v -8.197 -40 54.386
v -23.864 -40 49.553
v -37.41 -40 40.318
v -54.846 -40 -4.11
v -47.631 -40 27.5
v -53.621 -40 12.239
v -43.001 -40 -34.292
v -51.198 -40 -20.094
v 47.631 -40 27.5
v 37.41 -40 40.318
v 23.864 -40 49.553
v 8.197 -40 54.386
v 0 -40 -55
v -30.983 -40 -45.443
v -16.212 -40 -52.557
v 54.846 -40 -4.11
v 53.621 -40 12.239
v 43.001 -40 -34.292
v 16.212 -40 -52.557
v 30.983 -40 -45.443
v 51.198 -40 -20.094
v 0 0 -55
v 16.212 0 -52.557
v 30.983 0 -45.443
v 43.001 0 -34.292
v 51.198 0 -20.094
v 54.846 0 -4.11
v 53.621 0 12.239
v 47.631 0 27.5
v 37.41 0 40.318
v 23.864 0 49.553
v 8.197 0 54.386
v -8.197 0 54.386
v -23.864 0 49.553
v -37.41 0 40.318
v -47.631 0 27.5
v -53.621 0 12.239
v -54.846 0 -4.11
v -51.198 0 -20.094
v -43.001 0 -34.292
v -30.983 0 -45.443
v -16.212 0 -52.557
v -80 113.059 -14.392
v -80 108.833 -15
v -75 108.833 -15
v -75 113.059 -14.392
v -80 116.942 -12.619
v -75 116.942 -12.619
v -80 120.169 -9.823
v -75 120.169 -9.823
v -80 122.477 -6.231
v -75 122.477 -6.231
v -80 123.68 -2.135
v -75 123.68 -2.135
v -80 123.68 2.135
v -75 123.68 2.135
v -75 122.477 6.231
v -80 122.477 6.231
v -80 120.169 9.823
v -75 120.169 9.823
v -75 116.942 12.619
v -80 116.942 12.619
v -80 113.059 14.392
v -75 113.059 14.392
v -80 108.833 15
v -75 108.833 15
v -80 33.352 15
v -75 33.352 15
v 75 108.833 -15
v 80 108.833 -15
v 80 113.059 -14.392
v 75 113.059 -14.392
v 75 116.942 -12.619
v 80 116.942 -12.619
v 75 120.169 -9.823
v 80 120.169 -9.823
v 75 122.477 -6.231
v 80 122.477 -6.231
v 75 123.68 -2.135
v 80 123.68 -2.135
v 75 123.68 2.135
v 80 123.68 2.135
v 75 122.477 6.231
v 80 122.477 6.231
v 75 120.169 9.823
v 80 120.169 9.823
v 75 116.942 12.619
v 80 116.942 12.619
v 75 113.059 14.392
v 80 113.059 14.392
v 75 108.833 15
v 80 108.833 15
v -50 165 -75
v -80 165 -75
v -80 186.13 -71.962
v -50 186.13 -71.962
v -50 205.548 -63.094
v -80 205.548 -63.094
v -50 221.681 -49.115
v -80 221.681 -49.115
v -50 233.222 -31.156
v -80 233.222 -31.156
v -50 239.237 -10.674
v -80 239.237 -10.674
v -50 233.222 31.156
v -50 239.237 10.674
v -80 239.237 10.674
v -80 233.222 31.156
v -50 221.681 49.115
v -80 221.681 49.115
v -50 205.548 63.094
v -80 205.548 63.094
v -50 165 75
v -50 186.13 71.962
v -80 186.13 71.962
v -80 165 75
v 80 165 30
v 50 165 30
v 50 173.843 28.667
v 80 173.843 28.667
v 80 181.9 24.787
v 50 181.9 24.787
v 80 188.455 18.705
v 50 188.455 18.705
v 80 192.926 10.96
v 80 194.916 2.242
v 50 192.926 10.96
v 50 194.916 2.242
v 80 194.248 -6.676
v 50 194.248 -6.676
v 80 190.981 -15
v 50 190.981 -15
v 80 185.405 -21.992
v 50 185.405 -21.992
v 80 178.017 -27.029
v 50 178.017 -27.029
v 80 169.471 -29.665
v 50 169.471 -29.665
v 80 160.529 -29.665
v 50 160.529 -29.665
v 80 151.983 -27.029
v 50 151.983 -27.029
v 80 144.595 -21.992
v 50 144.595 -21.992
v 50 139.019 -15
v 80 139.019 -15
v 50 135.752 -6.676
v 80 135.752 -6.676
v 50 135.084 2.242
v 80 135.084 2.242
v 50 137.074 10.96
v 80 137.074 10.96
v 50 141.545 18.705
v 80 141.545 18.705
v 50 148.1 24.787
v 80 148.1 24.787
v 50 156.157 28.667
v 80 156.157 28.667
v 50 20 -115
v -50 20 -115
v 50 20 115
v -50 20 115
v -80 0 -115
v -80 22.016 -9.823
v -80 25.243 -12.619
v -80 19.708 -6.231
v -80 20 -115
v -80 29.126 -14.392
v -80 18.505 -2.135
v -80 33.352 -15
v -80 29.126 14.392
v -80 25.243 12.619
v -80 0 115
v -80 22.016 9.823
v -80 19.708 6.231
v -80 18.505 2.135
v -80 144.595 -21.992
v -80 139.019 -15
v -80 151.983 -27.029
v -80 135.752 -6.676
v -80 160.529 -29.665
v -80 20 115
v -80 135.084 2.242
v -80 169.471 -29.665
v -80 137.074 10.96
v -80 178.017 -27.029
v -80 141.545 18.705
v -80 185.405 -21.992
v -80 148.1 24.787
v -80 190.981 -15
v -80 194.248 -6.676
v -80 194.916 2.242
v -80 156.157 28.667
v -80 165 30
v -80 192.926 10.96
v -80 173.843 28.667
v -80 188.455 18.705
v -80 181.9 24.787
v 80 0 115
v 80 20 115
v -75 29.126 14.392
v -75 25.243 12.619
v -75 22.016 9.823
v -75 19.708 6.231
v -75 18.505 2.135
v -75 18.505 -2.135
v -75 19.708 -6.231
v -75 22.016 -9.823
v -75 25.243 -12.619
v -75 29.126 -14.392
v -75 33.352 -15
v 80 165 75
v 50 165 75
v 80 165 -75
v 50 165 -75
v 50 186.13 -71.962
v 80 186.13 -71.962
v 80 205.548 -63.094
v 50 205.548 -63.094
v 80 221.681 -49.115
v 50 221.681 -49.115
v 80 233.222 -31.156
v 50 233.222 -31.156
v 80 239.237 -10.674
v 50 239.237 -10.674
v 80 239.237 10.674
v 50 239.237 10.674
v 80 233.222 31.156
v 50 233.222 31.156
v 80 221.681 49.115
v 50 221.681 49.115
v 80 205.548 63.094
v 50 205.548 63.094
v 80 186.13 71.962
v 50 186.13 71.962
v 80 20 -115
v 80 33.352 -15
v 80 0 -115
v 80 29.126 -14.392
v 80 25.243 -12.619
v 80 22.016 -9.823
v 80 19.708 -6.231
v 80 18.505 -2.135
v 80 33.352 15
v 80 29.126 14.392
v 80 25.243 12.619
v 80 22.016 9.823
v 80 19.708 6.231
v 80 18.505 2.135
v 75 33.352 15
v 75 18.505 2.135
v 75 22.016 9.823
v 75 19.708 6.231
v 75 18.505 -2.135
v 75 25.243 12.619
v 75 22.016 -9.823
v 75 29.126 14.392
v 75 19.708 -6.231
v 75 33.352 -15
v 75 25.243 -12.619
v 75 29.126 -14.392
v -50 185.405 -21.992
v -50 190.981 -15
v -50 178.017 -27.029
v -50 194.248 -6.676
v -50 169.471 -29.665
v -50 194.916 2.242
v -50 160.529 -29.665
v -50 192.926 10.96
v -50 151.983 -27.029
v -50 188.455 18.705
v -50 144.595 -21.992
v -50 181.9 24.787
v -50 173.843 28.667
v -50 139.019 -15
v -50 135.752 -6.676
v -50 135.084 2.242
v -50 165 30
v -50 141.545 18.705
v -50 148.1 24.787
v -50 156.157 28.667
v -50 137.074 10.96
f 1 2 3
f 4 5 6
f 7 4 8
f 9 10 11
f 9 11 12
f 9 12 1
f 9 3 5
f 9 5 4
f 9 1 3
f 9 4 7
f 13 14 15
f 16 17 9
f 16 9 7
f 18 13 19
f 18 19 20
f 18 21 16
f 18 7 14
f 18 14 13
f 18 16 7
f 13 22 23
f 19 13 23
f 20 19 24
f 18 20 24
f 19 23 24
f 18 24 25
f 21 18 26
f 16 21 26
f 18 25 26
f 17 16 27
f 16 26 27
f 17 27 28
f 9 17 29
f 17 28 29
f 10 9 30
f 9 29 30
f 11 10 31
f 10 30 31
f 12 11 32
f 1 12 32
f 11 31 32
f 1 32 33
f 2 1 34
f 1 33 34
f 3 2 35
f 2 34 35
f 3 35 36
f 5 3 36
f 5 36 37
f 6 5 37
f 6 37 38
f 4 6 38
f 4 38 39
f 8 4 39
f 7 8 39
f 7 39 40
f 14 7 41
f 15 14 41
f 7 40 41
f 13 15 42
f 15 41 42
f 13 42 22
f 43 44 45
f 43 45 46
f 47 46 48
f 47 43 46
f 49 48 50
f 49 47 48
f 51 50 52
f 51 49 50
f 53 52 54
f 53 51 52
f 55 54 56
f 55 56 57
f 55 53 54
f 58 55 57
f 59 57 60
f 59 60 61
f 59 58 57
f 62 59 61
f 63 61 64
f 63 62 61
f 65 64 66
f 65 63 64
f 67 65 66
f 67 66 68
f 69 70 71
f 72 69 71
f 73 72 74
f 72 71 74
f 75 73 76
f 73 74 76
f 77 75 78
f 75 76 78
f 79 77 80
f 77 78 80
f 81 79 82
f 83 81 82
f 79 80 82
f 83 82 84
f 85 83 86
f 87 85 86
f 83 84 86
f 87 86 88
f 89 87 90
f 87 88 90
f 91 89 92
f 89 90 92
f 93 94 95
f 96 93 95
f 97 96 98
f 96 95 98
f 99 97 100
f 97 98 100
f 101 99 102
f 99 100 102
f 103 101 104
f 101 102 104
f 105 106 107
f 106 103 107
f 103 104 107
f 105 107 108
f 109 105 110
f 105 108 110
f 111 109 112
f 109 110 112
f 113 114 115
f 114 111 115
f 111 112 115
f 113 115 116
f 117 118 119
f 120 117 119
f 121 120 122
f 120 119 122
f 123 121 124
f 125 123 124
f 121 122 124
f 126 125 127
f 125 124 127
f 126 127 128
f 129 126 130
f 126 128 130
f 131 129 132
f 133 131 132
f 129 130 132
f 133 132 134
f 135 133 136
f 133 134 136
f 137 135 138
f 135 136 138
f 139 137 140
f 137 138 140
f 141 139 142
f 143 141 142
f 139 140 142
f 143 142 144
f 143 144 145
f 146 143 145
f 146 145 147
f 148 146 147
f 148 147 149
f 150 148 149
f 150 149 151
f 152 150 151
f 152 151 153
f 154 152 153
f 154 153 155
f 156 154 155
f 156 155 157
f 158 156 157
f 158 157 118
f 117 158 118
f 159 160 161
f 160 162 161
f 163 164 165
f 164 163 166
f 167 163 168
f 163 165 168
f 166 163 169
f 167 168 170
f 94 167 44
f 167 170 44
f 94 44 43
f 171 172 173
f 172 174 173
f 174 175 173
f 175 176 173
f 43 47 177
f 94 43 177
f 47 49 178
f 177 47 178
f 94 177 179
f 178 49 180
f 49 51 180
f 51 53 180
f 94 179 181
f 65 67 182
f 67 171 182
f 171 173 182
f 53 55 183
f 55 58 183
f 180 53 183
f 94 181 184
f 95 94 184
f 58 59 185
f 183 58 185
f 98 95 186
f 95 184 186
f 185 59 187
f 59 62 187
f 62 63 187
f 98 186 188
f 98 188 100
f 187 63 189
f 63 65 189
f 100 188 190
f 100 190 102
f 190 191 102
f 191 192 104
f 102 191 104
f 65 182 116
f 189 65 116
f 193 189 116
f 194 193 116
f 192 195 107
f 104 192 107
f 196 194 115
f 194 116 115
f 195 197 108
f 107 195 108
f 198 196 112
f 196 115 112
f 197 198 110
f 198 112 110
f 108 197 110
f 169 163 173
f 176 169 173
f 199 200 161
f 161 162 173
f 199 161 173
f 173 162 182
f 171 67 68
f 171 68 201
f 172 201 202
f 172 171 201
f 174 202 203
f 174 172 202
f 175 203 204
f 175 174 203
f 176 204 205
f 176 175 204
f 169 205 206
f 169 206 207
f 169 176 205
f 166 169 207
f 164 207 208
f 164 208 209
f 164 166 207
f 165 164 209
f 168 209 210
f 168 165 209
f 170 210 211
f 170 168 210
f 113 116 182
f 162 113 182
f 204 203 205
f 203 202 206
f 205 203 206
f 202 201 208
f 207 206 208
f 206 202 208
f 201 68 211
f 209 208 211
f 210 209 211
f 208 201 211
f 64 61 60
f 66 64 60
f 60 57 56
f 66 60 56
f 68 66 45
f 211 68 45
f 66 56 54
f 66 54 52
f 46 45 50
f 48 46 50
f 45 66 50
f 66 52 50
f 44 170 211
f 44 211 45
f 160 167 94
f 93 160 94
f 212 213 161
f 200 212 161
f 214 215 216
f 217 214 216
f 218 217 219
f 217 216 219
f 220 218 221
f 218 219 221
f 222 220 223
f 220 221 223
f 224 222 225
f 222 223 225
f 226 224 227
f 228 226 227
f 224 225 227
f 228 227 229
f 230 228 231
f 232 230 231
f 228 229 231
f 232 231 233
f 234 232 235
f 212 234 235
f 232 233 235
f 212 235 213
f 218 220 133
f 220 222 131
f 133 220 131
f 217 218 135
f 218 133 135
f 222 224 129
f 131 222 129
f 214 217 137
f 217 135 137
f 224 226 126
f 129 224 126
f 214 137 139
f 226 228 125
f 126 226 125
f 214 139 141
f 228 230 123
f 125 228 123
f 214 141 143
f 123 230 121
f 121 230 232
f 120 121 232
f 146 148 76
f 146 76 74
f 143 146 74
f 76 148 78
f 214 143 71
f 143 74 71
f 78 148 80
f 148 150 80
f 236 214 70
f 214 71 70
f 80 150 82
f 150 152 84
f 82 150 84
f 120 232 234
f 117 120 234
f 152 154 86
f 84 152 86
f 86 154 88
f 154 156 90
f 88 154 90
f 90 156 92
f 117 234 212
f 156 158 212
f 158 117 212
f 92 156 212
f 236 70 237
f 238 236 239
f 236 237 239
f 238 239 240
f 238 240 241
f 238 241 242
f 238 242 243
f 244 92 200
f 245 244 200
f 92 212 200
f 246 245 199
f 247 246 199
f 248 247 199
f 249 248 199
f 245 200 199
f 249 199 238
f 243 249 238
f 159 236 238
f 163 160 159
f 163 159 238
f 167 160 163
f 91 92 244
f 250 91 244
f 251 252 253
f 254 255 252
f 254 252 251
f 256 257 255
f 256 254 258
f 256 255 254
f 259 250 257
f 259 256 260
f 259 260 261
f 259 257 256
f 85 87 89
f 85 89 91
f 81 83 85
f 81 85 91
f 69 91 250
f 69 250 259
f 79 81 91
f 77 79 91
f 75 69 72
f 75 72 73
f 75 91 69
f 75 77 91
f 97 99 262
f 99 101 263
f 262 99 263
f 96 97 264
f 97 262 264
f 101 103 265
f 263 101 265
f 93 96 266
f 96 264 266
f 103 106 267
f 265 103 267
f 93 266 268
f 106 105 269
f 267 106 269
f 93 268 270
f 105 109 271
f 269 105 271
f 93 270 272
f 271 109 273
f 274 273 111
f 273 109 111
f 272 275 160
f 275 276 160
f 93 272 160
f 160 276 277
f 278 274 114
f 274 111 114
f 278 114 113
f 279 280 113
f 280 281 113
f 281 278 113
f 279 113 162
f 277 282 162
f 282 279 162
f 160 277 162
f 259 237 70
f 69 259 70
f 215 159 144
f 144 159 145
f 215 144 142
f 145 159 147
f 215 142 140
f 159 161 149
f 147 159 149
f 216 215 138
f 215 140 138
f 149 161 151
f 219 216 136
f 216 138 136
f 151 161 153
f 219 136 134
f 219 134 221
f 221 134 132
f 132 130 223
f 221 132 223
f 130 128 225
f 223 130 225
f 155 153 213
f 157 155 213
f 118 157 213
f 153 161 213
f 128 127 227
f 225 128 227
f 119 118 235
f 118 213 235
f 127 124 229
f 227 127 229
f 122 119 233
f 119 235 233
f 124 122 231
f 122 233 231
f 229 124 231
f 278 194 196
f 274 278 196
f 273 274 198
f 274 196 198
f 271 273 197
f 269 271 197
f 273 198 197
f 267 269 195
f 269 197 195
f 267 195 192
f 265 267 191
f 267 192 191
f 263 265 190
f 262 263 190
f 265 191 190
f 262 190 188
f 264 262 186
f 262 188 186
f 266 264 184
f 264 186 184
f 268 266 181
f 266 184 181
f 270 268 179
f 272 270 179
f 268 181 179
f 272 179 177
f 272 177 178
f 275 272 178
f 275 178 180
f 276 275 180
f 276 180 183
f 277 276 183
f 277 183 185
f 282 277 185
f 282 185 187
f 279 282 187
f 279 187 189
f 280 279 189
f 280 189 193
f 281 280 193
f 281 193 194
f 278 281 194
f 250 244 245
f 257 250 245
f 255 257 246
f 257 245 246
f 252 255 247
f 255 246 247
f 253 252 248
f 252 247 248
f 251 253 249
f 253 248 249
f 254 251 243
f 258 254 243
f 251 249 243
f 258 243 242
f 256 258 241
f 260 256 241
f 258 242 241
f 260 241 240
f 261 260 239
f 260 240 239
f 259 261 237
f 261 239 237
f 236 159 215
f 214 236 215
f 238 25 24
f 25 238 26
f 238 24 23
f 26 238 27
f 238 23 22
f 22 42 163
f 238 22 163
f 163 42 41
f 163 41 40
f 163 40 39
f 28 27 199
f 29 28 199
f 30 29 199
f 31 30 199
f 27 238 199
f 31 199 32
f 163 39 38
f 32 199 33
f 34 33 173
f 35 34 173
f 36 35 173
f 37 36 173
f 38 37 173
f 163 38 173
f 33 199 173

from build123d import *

# Parameters (mm, degrees)
BOSS_EXTRUDE1_DEPTH = 115
SKETCH3_R           = 55
BOSS_EXTRUDE2_DEPTH = 40
CUT_EXTRUDE2_REACH  = 312.524
SKETCH2_R           = 30
CUT_EXTRUDE3_DEPTH  = 5


with BuildPart() as part:
    # Sketch1 → Boss-Extrude1 (new, symmetric)
    with BuildSketch(Plane.XY):
        Polygon((80, 0), (-80, 0), (-80, 240), (-50, 240), (-50, 20), (50, 20), (50, 240), (80, 240), align=None)
    extrude(amount=BOSS_EXTRUDE1_DEPTH, both=True)

    # Sketch3 → Boss-Extrude2 (add)
    with BuildSketch(Plane.XZ):
        with Locations(Location((0, 0, 0), (0, 0, 270))):
            Circle(SKETCH3_R)
    extrude(amount=BOSS_EXTRUDE2_DEPTH)

    # Cut-Extrude2: up to this face of the body (flat: up to its plane)
    cut_extrude2_end = Plane(part.part.faces().sort_by_distance((80, 120, 0))[0])
    # Sketch2 → Cut-Extrude2 (cut, up to the picked face)
    with BuildSketch(Plane.ZY.offset(80), mode=Mode.PRIVATE) as cut_extrude2_sk1:
        with BuildLine():
            ThreePointArc((-75, 165), (-53.033008792, 218.033008386), (-5.74e-07, 240))
            Line((-5.74e-07, 240), (-115, 240))
            Line((-115, 240), (-115, 20))
            Line((-115, 20), (-75, 165))
        make_face()
    cut_extrude2_tool1 = split(extrude(cut_extrude2_sk1.sketch, amount=-CUT_EXTRUDE2_REACH, mode=Mode.PRIVATE), bisect_by=cut_extrude2_end, keep=Keep.BOTH, mode=Mode.PRIVATE)
    # Sketch2 → Cut-Extrude2 (cut, up to the picked face)
    with BuildSketch(Plane.ZY.offset(80), mode=Mode.PRIVATE) as cut_extrude2_sk2:
        with BuildLine():
            ThreePointArc((-5.74e-07, 240), (53.033008386, 218.033008792), (75, 165))
            Line((75, 165), (115, 20))
            Line((115, 20), (115, 240))
            Line((115, 240), (-5.74e-07, 240))
        make_face()
    cut_extrude2_tool2 = split(extrude(cut_extrude2_sk2.sketch, amount=-CUT_EXTRUDE2_REACH, mode=Mode.PRIVATE), bisect_by=cut_extrude2_end, keep=Keep.BOTH, mode=Mode.PRIVATE)
    # Sketch2 → Cut-Extrude2 (cut, up to the picked face)
    with BuildSketch(Plane.ZY.offset(80), mode=Mode.PRIVATE) as cut_extrude2_sk3:
        with Locations((0, 165)):
            Circle(SKETCH2_R)
    cut_extrude2_tool3 = split(extrude(cut_extrude2_sk3.sketch, amount=-CUT_EXTRUDE2_REACH, mode=Mode.PRIVATE), bisect_by=cut_extrude2_end, keep=Keep.BOTH, mode=Mode.PRIVATE)
    add(cut_extrude2_tool1.solids().sort_by(Axis((-80, 171.000425, -91.477903), (1, 0, 0)))[0], mode=Mode.SUBTRACT)
    add(cut_extrude2_tool2.solids().sort_by(Axis((-80, 171.000425, 91.477903), (1, 0, 0)))[0], mode=Mode.SUBTRACT)
    add(cut_extrude2_tool3.solids().sort_by(Axis((-80, 165, 0), (1, 0, 0)))[0], mode=Mode.SUBTRACT)

    # Sketch4 → Cut-Extrude3 (cut)
    with BuildSketch(Plane.ZY.offset(80)):
        with BuildLine():
            Line((15, 108.832847002), (15, 33.352154436))
            ThreePointArc((15, 33.352154436), (0, 18.352154436), (-15, 33.352154436))
            Line((-15, 33.352154436), (-15, 108.832847002))
            ThreePointArc((-15, 108.832847002), (0, 123.832847002), (15, 108.832847002))
        make_face()
    cut_extrude3 = extrude(amount=-CUT_EXTRUDE3_DEPTH, mode=Mode.SUBTRACT)

    # Mirror1: Cut-Extrude3 across plane
    add(cut_extrude3.mirror(Plane(origin=(0, 0, 0), x_dir=(0, 0, 1), z_dir=(1, 0, 0))), mode=Mode.SUBTRACT)


solid = part.part
